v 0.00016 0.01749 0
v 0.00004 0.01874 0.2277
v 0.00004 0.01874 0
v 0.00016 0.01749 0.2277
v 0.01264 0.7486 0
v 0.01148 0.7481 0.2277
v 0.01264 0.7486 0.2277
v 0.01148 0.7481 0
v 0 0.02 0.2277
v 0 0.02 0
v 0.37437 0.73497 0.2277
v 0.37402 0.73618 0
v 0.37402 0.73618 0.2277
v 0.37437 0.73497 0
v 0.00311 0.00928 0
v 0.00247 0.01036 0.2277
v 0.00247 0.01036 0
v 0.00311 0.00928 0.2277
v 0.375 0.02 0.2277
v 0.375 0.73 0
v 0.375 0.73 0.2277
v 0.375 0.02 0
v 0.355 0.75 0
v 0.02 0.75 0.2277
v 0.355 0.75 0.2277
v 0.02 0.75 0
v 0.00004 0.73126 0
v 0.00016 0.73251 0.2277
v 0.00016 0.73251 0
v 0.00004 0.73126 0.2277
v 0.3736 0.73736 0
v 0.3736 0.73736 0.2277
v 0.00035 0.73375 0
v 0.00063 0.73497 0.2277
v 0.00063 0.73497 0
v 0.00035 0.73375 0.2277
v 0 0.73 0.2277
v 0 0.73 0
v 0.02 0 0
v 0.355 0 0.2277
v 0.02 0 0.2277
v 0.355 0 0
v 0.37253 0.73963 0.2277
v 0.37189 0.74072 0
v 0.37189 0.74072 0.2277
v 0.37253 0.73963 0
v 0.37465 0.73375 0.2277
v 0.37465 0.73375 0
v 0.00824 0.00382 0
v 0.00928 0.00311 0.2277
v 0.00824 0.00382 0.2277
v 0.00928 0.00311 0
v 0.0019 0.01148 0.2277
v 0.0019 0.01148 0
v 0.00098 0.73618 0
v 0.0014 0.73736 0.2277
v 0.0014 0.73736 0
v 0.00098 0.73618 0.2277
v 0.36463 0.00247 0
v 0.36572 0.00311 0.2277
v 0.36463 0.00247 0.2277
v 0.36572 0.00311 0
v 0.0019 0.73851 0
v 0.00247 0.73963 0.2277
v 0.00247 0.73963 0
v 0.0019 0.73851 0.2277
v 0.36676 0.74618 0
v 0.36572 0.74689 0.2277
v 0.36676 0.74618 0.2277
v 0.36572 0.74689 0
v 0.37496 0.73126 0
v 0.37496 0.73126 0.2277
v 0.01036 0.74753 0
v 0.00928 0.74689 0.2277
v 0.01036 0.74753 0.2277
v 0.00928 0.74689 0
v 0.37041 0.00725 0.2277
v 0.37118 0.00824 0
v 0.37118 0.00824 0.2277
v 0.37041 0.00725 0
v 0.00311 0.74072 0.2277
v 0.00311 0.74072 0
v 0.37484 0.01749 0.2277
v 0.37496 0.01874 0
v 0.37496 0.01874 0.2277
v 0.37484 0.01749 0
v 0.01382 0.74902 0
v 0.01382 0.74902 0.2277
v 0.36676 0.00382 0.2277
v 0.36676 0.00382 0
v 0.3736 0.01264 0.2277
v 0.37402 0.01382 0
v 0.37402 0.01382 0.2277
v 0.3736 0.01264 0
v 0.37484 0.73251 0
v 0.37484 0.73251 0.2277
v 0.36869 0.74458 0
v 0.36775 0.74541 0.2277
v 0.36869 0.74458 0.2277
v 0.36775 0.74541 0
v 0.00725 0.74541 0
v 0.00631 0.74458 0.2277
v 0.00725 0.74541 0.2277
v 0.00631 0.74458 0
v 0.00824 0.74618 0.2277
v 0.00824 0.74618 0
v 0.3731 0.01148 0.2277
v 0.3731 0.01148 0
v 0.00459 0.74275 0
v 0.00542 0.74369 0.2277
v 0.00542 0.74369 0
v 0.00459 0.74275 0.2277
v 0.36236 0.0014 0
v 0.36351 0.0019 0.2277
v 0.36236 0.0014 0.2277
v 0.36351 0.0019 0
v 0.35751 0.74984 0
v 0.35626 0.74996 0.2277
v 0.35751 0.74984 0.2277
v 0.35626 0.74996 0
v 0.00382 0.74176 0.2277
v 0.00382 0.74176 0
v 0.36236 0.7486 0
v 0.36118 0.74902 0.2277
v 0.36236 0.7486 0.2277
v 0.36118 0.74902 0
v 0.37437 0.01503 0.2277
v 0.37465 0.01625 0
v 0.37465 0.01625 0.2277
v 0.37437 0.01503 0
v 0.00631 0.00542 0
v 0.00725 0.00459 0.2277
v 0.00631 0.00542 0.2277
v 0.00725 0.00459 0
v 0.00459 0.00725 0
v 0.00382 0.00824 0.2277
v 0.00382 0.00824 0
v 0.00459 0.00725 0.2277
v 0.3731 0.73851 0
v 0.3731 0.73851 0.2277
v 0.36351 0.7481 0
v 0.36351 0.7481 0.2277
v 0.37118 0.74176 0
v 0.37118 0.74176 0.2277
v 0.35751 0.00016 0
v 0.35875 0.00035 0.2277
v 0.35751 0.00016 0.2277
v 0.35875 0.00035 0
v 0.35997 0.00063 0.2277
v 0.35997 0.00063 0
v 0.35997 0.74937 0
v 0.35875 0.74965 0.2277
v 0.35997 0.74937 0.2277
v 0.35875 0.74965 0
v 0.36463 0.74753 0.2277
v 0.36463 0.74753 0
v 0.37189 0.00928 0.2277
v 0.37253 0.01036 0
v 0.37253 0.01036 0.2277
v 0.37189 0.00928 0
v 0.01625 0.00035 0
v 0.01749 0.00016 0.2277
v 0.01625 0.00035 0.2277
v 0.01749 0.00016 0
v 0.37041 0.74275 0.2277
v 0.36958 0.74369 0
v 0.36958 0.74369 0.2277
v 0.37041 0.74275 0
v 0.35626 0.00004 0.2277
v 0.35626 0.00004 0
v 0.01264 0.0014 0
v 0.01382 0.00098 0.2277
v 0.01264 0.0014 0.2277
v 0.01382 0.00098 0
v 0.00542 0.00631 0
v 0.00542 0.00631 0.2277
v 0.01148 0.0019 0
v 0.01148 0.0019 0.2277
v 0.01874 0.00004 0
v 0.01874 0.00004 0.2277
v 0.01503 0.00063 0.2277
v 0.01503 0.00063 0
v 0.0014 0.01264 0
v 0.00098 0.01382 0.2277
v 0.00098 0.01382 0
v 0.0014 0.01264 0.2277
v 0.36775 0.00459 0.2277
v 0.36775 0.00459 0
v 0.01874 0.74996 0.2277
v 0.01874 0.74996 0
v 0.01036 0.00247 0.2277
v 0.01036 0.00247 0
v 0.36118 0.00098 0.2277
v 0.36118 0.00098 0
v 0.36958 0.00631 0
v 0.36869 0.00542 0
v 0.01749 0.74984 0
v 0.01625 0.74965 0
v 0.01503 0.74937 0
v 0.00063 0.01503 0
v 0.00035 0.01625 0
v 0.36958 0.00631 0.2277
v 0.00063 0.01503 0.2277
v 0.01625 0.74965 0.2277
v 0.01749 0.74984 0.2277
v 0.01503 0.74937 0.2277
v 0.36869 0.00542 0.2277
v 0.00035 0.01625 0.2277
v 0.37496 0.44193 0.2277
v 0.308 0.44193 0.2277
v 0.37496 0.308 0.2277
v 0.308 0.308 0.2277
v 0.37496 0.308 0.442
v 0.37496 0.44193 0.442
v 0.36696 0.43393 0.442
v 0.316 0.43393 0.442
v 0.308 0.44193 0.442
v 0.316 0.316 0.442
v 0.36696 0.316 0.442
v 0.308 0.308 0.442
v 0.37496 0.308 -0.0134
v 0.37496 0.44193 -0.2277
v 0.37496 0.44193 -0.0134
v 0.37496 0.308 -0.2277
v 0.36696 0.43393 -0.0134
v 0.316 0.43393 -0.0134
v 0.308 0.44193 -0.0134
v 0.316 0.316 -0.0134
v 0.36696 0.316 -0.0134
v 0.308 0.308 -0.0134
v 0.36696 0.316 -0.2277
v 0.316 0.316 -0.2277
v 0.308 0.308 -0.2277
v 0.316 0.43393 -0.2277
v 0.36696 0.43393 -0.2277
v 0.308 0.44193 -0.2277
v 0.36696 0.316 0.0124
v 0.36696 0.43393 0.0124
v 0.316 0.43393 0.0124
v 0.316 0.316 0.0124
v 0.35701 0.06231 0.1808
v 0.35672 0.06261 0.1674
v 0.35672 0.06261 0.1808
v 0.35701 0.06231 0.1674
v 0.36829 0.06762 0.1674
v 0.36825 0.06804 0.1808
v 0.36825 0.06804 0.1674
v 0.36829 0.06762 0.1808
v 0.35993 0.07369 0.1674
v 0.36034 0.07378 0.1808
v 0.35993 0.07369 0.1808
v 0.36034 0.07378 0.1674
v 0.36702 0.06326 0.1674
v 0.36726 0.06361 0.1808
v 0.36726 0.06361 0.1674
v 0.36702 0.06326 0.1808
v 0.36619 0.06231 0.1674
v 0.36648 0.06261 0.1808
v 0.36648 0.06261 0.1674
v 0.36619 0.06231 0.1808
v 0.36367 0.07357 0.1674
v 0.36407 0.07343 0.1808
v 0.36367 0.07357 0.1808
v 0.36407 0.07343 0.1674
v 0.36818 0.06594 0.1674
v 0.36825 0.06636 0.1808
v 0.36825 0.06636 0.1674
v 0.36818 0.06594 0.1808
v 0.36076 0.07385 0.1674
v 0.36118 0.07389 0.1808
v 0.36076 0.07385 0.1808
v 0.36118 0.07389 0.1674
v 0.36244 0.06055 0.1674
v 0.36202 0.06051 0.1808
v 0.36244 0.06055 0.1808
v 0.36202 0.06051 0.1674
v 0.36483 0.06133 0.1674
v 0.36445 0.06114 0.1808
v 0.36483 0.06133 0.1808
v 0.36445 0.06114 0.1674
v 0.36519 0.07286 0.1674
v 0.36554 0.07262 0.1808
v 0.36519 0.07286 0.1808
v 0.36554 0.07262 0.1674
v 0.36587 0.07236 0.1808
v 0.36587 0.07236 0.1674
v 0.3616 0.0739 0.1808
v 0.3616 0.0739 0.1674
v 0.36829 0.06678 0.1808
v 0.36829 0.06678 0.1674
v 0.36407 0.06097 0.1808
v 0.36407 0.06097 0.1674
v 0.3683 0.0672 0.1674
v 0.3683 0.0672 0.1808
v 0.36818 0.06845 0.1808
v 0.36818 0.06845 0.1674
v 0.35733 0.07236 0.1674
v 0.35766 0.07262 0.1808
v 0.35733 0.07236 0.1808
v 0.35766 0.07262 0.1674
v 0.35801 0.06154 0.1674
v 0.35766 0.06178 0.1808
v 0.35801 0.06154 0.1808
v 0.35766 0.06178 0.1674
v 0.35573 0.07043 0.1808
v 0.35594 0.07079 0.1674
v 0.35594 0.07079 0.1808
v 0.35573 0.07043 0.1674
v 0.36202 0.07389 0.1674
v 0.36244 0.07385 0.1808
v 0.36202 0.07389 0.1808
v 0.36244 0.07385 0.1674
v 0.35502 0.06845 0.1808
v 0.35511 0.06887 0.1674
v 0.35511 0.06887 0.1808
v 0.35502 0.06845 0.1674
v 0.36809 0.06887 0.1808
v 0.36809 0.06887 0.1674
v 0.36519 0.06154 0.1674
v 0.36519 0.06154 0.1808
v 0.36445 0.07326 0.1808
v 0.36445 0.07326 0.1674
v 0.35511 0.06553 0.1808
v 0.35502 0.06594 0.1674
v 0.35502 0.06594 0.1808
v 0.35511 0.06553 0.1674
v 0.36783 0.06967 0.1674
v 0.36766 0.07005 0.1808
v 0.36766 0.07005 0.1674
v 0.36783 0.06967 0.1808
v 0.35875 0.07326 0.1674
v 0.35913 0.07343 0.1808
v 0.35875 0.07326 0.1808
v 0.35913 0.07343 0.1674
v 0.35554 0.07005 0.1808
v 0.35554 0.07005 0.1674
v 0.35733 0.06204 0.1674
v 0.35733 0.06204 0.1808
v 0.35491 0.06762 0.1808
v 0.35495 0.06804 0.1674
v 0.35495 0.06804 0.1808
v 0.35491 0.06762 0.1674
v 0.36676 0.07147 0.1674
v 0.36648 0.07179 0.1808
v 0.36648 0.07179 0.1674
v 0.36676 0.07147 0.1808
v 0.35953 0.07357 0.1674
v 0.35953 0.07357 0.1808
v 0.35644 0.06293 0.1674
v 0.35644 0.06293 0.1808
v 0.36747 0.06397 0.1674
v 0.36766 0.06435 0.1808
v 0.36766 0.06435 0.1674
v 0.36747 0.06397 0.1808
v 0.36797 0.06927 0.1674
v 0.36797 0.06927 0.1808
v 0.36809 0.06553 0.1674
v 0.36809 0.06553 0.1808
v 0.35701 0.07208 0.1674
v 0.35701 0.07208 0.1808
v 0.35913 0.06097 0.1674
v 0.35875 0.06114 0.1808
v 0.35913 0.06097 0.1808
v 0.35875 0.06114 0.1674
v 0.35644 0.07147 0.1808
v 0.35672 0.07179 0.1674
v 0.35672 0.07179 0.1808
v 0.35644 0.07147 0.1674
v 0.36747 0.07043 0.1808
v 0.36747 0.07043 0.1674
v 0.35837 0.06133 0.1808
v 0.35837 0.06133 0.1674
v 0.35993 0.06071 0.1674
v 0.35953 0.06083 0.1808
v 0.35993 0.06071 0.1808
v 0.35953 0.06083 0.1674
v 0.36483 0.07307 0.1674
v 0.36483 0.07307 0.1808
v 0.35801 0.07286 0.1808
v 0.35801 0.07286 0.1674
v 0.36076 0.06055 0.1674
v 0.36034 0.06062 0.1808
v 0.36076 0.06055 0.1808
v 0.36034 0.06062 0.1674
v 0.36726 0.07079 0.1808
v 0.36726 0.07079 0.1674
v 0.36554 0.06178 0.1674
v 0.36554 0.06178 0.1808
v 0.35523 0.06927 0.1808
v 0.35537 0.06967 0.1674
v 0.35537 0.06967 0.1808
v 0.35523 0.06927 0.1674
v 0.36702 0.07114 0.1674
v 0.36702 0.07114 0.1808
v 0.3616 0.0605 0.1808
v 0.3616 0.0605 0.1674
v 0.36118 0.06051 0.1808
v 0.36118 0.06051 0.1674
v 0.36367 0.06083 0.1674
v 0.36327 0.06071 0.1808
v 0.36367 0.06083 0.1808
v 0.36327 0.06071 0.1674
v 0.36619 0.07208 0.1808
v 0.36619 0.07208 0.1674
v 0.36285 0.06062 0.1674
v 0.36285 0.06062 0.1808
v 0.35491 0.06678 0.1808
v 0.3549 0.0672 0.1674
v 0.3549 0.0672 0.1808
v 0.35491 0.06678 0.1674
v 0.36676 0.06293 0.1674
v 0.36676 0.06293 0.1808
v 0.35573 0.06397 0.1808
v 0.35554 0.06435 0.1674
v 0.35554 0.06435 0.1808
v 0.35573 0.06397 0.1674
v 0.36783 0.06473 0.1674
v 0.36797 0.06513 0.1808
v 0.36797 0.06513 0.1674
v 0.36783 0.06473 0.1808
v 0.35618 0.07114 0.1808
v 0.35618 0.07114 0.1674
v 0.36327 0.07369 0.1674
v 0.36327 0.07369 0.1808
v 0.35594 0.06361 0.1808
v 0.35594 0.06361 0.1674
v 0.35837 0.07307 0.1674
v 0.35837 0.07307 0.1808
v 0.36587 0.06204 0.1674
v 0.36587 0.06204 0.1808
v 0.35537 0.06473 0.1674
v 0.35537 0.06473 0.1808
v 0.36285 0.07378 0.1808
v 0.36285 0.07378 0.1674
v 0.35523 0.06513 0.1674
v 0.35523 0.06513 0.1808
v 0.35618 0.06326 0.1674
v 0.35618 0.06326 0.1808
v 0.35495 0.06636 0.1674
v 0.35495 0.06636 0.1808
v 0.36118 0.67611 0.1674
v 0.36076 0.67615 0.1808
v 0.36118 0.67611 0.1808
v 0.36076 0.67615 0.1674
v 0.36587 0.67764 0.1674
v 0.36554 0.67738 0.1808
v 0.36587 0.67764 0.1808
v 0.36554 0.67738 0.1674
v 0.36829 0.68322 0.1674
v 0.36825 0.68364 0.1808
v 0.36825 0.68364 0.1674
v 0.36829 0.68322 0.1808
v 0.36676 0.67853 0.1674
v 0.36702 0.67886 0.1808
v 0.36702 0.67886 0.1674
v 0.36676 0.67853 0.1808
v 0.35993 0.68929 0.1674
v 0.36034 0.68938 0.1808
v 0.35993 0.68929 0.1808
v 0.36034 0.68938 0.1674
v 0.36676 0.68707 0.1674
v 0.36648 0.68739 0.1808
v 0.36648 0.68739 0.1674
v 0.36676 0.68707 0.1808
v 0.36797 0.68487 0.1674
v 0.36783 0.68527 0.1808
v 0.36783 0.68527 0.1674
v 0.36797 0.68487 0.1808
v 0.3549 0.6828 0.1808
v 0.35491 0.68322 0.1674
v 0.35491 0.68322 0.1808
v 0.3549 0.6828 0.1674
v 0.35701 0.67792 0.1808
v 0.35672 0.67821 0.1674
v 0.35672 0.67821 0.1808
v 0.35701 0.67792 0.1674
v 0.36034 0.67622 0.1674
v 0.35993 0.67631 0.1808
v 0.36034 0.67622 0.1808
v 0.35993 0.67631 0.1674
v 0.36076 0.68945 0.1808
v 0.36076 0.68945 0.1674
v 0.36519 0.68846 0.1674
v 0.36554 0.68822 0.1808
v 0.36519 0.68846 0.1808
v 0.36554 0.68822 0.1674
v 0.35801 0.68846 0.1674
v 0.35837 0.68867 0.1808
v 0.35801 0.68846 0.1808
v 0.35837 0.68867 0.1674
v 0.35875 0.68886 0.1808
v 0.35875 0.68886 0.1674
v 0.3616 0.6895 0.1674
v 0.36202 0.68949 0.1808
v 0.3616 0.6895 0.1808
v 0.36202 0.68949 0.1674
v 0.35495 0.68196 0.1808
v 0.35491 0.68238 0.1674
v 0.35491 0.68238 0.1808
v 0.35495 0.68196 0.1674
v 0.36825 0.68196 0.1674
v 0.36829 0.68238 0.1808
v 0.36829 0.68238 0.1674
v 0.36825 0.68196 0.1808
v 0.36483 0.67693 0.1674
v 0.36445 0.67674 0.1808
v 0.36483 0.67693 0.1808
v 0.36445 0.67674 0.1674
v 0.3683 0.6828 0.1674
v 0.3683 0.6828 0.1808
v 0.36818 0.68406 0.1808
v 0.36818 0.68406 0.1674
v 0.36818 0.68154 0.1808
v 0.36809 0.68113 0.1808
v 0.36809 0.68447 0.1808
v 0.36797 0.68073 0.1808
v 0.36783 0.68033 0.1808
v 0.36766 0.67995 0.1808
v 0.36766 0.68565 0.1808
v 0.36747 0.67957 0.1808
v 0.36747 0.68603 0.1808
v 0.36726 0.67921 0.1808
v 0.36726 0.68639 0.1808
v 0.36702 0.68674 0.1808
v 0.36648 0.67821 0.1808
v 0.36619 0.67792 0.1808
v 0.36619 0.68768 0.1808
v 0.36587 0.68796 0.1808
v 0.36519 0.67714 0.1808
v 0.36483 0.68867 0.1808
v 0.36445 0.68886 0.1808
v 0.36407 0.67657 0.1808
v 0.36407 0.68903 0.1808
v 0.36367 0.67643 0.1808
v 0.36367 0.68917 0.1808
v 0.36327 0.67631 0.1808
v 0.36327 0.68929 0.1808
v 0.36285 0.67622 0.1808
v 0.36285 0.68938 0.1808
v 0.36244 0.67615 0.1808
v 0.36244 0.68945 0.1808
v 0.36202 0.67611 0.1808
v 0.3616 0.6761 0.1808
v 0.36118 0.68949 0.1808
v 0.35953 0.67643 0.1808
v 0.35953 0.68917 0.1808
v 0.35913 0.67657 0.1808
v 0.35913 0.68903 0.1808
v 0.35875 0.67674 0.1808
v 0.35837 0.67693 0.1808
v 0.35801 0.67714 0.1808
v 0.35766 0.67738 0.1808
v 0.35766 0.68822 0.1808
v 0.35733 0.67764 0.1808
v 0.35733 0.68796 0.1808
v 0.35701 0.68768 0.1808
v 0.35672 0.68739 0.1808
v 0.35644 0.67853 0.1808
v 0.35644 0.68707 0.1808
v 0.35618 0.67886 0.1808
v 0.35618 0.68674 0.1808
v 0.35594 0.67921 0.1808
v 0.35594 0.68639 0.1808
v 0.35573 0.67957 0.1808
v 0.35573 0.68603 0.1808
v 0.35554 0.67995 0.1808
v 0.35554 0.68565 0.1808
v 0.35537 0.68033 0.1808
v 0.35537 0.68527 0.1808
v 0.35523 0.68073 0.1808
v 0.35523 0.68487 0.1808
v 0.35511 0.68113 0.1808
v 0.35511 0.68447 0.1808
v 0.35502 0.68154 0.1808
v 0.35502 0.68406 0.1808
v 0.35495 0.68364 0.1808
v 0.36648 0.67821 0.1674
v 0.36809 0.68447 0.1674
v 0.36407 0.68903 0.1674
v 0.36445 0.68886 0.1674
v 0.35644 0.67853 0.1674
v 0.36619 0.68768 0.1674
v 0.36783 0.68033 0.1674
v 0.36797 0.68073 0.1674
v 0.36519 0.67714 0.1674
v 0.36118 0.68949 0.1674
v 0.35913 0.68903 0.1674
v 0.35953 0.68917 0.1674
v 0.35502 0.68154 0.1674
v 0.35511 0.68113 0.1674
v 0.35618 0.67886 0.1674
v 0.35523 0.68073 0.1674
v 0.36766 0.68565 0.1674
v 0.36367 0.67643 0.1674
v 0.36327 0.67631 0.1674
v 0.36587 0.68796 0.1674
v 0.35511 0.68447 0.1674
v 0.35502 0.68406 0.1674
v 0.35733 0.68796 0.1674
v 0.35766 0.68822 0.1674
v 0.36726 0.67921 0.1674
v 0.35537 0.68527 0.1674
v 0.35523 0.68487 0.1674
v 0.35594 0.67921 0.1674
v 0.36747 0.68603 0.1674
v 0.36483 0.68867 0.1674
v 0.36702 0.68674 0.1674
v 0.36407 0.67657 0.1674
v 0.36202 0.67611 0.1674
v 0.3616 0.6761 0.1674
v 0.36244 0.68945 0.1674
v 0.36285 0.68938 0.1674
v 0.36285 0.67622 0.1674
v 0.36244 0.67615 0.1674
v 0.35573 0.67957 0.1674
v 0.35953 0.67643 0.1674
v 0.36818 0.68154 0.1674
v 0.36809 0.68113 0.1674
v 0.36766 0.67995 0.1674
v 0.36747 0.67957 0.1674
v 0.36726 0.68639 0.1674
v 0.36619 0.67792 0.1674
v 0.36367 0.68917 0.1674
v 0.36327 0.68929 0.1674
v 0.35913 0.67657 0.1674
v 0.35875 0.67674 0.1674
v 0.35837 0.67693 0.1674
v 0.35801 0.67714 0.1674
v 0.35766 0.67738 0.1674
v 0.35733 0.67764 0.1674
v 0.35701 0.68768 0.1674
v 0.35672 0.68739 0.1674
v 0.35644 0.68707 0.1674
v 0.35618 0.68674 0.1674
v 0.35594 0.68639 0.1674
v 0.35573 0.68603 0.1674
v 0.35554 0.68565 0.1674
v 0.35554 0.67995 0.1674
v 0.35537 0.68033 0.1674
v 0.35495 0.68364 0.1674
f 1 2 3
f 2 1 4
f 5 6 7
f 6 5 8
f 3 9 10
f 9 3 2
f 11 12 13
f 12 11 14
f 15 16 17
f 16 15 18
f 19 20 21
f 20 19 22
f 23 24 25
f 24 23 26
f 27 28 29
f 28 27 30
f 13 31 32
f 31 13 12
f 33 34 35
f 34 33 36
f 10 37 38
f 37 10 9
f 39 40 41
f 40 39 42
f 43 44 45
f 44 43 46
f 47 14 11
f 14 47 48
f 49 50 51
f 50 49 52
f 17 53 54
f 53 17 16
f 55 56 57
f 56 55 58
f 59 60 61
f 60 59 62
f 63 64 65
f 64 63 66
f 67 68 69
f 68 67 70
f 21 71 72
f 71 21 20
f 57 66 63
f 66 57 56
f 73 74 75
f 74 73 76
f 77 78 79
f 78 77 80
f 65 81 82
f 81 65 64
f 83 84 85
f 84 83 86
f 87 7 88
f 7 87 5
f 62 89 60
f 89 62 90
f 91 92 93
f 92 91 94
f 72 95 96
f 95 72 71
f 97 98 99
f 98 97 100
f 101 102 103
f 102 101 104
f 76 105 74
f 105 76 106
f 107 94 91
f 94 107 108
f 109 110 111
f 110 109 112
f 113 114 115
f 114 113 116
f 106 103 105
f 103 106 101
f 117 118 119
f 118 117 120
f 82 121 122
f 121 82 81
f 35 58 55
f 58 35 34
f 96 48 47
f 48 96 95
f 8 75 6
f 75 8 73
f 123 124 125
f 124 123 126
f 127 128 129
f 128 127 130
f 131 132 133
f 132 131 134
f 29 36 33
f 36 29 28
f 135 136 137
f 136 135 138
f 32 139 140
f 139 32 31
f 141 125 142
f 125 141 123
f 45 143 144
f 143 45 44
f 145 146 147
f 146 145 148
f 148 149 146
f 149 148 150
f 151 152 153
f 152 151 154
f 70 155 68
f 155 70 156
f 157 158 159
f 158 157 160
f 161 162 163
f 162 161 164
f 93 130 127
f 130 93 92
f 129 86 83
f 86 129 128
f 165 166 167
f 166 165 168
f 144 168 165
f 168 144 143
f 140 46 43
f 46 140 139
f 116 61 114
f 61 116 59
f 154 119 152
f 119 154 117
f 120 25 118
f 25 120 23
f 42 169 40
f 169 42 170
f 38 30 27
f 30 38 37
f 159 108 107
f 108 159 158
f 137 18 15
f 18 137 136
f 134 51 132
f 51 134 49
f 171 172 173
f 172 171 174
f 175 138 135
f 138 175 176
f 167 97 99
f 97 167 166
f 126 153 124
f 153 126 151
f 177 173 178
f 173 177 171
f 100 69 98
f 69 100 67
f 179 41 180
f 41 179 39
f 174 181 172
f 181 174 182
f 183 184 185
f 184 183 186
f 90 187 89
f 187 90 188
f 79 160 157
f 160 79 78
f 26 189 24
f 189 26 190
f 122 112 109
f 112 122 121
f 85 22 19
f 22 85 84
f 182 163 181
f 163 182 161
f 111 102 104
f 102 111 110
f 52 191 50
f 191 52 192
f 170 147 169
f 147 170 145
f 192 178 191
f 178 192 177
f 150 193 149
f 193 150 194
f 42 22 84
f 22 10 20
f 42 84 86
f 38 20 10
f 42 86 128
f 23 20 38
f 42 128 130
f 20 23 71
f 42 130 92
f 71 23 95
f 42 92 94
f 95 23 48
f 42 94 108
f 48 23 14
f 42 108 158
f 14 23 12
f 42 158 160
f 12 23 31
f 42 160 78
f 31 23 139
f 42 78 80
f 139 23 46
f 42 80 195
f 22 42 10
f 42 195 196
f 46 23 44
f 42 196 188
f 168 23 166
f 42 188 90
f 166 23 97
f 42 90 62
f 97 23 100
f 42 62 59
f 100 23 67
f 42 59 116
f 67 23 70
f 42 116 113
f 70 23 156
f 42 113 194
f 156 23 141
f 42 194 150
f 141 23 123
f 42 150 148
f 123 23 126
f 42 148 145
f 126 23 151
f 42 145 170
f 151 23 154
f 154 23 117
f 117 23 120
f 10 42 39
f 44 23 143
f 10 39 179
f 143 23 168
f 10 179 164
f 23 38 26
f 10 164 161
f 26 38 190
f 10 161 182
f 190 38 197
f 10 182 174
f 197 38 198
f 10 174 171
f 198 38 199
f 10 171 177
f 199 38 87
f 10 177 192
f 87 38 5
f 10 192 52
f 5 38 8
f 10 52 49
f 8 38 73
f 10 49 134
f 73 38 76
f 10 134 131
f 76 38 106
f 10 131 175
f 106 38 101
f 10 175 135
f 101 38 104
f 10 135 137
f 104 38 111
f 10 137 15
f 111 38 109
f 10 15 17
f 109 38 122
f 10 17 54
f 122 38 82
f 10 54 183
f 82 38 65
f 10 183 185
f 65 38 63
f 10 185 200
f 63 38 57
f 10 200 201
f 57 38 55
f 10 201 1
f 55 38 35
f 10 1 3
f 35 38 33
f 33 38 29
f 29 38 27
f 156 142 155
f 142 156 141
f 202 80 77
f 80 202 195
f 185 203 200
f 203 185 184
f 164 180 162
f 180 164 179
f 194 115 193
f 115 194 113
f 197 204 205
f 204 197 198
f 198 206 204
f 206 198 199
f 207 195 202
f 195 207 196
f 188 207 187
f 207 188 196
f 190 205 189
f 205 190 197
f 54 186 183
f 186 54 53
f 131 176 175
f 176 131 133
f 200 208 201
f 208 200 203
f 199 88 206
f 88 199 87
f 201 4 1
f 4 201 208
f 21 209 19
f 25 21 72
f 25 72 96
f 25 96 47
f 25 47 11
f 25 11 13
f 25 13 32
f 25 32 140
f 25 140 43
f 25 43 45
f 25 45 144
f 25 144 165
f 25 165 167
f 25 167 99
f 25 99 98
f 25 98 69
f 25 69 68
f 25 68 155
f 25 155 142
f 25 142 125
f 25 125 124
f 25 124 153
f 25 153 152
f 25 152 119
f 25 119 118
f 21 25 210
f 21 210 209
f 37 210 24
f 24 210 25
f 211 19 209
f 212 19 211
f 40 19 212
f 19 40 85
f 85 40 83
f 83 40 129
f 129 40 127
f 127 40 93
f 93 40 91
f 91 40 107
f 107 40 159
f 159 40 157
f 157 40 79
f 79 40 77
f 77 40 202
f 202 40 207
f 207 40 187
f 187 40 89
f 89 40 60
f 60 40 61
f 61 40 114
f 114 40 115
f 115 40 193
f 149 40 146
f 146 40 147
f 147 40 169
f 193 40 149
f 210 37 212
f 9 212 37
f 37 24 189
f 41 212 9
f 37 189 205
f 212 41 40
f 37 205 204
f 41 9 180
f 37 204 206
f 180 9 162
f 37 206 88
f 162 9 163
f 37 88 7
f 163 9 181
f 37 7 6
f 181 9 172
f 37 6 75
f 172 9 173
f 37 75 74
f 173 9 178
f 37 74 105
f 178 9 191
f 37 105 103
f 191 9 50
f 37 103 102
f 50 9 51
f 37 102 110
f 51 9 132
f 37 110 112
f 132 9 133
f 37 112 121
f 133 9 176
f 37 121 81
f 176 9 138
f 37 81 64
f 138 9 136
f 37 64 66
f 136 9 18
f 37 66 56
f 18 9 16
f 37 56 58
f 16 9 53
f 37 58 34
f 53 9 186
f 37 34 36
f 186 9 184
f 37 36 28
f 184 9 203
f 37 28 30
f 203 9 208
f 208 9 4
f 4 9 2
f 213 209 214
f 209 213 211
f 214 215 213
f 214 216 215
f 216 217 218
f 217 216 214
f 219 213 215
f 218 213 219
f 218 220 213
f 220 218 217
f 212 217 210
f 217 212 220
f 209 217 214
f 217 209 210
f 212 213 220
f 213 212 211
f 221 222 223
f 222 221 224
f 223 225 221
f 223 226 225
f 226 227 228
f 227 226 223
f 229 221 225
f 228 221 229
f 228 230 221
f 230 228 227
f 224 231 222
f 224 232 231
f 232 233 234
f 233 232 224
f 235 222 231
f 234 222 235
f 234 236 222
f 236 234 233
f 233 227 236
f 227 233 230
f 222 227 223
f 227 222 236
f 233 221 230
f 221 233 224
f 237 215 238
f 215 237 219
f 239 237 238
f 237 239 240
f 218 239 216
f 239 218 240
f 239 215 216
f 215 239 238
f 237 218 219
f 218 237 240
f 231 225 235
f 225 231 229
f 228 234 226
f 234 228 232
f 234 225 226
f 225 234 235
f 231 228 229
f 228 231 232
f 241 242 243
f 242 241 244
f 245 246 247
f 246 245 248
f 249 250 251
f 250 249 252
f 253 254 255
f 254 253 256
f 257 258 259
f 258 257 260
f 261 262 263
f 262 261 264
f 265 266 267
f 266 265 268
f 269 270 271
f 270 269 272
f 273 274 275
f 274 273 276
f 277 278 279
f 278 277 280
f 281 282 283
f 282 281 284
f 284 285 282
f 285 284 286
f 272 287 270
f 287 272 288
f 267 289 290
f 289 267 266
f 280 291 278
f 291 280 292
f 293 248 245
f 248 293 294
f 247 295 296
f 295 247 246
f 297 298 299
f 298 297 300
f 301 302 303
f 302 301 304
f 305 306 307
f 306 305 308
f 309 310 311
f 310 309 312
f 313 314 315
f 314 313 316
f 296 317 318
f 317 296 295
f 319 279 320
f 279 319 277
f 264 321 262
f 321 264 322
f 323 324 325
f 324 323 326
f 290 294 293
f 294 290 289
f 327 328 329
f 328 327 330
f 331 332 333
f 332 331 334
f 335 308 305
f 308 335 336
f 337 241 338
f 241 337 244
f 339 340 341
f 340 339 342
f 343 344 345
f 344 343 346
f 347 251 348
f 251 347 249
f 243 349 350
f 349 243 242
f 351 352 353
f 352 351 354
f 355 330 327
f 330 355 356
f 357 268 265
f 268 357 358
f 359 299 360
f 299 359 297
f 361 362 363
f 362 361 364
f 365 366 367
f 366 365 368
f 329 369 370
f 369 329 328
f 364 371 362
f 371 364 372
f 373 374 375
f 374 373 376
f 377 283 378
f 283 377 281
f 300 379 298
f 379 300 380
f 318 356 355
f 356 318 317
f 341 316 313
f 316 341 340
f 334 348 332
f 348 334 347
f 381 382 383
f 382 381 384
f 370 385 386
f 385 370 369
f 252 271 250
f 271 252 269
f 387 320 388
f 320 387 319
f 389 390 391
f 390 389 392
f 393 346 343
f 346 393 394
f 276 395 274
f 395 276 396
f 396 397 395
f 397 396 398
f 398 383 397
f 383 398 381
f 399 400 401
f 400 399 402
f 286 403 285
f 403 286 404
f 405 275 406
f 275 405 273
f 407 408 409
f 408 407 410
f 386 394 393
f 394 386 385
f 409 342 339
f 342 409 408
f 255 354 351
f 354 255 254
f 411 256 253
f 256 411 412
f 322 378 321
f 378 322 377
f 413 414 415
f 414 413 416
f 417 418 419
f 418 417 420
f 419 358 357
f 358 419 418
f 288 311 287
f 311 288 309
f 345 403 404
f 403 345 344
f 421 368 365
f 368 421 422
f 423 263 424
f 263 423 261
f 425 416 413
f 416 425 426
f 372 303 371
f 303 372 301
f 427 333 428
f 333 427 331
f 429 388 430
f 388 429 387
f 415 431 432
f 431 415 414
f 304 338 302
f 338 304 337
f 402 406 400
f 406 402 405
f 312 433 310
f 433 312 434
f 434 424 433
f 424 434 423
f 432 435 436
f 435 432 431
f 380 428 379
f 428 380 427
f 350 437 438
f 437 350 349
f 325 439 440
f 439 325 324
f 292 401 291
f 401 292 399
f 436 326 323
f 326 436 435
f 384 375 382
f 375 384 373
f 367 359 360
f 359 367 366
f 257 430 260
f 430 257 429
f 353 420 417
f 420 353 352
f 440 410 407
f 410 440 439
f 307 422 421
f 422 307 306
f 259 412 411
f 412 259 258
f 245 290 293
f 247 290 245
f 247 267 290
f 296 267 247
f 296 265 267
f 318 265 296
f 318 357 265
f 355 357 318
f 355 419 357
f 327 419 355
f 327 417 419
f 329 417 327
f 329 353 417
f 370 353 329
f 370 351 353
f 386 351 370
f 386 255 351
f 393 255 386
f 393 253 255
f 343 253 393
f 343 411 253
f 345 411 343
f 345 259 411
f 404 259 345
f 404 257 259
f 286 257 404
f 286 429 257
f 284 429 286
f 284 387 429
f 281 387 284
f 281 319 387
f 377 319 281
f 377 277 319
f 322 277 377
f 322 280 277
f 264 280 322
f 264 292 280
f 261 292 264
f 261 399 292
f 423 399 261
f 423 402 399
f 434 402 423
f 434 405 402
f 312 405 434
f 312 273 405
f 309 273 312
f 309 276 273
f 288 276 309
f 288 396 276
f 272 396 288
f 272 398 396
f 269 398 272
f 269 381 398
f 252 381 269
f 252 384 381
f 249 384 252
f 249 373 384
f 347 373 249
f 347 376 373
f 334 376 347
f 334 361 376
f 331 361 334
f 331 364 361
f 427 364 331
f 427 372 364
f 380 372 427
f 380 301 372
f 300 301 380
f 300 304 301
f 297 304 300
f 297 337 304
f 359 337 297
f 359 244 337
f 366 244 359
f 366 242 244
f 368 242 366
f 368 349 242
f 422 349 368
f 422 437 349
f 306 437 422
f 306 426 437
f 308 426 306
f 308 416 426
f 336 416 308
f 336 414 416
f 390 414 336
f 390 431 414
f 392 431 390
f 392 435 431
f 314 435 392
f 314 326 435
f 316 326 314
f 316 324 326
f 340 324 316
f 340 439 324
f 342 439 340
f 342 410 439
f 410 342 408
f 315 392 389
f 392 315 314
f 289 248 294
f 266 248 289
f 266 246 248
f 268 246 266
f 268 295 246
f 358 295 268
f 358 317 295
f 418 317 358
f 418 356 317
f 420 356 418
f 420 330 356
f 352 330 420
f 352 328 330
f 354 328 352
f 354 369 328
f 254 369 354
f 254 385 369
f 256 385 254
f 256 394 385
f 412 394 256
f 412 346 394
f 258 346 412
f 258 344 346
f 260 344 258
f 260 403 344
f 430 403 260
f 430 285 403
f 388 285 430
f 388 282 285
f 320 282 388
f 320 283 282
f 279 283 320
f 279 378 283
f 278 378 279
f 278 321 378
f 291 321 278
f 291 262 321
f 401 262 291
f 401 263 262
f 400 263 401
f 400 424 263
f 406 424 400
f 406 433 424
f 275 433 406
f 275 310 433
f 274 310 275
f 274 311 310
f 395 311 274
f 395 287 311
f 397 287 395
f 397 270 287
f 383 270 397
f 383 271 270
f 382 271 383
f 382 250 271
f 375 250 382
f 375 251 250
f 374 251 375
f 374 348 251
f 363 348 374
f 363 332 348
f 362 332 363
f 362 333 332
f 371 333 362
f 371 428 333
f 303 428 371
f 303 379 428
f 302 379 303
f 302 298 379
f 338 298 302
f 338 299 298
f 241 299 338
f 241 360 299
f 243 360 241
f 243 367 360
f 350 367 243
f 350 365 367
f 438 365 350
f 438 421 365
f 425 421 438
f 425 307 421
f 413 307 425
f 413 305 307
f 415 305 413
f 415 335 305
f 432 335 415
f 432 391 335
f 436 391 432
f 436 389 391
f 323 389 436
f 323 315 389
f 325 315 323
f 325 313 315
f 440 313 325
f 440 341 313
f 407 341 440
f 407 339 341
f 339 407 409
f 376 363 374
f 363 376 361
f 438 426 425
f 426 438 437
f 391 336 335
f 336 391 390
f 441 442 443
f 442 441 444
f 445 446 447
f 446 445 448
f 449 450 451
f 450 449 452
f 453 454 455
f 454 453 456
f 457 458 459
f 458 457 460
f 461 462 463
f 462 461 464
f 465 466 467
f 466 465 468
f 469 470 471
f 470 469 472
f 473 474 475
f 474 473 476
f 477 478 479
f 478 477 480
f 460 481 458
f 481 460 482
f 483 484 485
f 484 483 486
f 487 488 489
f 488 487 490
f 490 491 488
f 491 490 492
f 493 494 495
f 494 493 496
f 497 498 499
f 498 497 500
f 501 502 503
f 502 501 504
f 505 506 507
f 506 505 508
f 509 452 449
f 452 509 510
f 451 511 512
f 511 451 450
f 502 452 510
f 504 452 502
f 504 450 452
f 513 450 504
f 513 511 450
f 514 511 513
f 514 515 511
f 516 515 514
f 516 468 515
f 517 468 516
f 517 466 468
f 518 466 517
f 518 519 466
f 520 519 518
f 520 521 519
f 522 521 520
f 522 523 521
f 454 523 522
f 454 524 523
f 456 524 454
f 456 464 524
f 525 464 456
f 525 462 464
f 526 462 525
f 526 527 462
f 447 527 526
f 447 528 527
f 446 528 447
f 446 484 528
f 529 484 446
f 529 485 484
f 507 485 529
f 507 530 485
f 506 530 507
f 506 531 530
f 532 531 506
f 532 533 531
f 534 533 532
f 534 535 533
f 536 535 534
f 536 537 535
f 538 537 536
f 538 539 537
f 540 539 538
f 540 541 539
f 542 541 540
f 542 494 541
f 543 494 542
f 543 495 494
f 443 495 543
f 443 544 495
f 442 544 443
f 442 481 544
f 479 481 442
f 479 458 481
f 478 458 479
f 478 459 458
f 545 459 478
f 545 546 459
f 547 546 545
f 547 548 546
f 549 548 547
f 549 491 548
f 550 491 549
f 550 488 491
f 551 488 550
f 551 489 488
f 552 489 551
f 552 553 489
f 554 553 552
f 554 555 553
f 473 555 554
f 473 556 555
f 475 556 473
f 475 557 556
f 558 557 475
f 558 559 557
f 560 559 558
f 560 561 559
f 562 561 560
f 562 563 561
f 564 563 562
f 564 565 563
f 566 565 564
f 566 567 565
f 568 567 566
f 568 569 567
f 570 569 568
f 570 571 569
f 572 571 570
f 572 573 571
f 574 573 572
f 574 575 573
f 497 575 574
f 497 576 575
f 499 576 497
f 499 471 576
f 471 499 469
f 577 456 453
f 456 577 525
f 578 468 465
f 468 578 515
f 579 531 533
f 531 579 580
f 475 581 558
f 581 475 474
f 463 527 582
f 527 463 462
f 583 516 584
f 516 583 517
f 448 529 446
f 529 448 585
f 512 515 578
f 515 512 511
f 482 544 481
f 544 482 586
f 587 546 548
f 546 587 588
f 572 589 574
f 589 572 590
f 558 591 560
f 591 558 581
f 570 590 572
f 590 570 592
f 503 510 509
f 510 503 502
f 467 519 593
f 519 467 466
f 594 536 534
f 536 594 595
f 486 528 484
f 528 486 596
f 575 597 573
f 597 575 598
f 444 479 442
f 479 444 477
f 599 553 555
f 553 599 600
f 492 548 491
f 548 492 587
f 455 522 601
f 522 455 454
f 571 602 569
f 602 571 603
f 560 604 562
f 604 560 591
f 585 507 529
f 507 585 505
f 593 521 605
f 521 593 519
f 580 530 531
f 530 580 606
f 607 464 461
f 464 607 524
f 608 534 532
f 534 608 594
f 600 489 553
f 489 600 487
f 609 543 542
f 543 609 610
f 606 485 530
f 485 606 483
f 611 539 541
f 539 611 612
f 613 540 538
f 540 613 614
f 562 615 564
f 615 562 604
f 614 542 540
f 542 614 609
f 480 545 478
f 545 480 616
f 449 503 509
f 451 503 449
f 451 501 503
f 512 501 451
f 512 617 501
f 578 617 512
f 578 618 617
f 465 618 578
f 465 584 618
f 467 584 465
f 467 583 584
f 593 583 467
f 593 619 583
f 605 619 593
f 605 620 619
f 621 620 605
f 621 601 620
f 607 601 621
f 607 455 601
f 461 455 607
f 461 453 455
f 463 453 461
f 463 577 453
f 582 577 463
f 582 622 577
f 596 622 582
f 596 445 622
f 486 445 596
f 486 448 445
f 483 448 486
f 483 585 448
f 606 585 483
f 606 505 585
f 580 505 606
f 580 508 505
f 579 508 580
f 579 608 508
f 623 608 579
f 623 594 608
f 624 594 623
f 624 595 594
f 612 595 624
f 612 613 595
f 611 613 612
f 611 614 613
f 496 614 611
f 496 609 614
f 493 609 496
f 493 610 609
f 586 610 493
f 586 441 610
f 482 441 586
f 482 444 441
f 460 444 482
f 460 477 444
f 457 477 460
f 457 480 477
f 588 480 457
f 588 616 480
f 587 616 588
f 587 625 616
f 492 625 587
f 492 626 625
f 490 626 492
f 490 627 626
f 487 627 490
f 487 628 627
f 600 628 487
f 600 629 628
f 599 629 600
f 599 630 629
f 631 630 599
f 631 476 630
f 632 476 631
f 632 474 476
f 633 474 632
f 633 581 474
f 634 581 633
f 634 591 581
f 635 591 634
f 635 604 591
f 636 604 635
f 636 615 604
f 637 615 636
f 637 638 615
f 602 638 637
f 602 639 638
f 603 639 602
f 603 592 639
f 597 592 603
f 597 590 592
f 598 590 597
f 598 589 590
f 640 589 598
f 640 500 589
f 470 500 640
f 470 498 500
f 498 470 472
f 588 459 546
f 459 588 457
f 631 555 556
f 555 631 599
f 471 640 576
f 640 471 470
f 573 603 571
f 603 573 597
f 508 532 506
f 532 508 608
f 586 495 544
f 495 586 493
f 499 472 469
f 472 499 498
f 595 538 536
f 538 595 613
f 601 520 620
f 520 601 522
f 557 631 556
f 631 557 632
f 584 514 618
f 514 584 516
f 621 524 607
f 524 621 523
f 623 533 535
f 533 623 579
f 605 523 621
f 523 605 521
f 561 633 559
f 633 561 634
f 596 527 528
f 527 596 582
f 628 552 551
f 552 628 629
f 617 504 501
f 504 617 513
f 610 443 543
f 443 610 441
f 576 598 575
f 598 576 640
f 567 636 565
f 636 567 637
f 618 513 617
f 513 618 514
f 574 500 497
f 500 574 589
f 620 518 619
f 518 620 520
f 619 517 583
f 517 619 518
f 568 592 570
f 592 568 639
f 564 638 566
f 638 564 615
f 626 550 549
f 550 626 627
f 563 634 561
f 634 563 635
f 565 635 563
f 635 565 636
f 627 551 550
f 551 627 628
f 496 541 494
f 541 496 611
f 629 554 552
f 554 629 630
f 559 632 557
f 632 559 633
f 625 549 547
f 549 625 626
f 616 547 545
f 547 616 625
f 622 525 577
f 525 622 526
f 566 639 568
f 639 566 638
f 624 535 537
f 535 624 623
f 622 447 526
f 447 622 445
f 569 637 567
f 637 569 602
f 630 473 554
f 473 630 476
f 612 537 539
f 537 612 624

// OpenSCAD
// === Parametric Dimensions ===

// Base slab
base_length = 0.375;
base_width = 0.75;
base_height = 0.013393;
base_extrude = 0.0134;
corner_radius = 0.02;

// Upper body (second solid, same footprint)
body_reach = 0.2277;
body_start_z = base_extrude;
body_height = body_reach - body_start_z;

// Sleeve/post feature
sleeve_left = 0.308;
sleeve_front = 0.308;
sleeve_length = 0.066964;
sleeve_width = 0.133929;
sleeve_reach = 0.442;
sleeve_start_z = body_reach;
sleeve_height = sleeve_reach - sleeve_start_z;
sleeve_wall = 0.008;

// Lower continuation beneath base
lower_bottom_z = -0.2277;
lower_top_z = -0.0134;
lower_height = lower_top_z - lower_bottom_z;

// Circular hole cuts
hole_radius = 0.0067;
hole_x = 0.3616;
hole_y1 = 0.0672;
hole_y2 = 0.6828;
hole_z_bottom = 0.1674;
hole_z_top = 0.1808;
hole_depth = hole_z_top - hole_z_bottom;

$fn = 100;

// === Modules ===

// 2D rounded rectangle profile
module rounded_rect_2d(l, w, r) {
    hull() {
        translate([r, r])       circle(r=r);
        translate([l-r, r])     circle(r=r);
        translate([l-r, w-r])   circle(r=r);
        translate([r, w-r])     circle(r=r);
    }
}

// Rectangular inner void with uniform wall thickness
module inner_void(l, w, wall, h) {
    translate([wall, wall, 0])
        cube([l - 2*wall, w - 2*wall, h]);
}

// === Main Model ===

difference() {
    // -- Solid bodies --
    union() {
        // Base slab: rounded footprint, extruded from datum
        linear_extrude(height = base_extrude)
            rounded_rect_2d(base_length, base_width, corner_radius);

        // Upper body: same rounded footprint, extends to body_reach
        translate([0, 0, body_start_z])
            linear_extrude(height = body_height)
                rounded_rect_2d(base_length, base_width, corner_radius);

        // Sleeve/post outer shell
        translate([sleeve_left, sleeve_front, sleeve_start_z])
            cube([sleeve_length, sleeve_width, sleeve_height]);

        // Lower continuation outer shell below base
        translate([sleeve_left, sleeve_front, lower_bottom_z])
            cube([sleeve_length, sleeve_width, lower_height]);
    }

    // -- Voids and cuts --
    union() {
        // Sleeve inner void through upper body and sleeve (keeps inner loops open)
        translate([sleeve_left, sleeve_front, body_start_z - 0.001])
            inner_void(sleeve_length, sleeve_width, sleeve_wall,
                       sleeve_reach - body_start_z + 0.002);

        // Lower continuation inner void
        translate([sleeve_left, sleeve_front, lower_bottom_z - 0.001])
            inner_void(sleeve_length, sleeve_width, sleeve_wall,
                       lower_height + 0.002);

        // Circular hole near front edge
        translate([hole_x, hole_y1, hole_z_bottom])
            cylinder(h = hole_depth, r = hole_radius);

        // Circular hole near back edge
        translate([hole_x, hole_y2, hole_z_bottom])
            cylinder(h = hole_depth, r = hole_radius);
    }
}
